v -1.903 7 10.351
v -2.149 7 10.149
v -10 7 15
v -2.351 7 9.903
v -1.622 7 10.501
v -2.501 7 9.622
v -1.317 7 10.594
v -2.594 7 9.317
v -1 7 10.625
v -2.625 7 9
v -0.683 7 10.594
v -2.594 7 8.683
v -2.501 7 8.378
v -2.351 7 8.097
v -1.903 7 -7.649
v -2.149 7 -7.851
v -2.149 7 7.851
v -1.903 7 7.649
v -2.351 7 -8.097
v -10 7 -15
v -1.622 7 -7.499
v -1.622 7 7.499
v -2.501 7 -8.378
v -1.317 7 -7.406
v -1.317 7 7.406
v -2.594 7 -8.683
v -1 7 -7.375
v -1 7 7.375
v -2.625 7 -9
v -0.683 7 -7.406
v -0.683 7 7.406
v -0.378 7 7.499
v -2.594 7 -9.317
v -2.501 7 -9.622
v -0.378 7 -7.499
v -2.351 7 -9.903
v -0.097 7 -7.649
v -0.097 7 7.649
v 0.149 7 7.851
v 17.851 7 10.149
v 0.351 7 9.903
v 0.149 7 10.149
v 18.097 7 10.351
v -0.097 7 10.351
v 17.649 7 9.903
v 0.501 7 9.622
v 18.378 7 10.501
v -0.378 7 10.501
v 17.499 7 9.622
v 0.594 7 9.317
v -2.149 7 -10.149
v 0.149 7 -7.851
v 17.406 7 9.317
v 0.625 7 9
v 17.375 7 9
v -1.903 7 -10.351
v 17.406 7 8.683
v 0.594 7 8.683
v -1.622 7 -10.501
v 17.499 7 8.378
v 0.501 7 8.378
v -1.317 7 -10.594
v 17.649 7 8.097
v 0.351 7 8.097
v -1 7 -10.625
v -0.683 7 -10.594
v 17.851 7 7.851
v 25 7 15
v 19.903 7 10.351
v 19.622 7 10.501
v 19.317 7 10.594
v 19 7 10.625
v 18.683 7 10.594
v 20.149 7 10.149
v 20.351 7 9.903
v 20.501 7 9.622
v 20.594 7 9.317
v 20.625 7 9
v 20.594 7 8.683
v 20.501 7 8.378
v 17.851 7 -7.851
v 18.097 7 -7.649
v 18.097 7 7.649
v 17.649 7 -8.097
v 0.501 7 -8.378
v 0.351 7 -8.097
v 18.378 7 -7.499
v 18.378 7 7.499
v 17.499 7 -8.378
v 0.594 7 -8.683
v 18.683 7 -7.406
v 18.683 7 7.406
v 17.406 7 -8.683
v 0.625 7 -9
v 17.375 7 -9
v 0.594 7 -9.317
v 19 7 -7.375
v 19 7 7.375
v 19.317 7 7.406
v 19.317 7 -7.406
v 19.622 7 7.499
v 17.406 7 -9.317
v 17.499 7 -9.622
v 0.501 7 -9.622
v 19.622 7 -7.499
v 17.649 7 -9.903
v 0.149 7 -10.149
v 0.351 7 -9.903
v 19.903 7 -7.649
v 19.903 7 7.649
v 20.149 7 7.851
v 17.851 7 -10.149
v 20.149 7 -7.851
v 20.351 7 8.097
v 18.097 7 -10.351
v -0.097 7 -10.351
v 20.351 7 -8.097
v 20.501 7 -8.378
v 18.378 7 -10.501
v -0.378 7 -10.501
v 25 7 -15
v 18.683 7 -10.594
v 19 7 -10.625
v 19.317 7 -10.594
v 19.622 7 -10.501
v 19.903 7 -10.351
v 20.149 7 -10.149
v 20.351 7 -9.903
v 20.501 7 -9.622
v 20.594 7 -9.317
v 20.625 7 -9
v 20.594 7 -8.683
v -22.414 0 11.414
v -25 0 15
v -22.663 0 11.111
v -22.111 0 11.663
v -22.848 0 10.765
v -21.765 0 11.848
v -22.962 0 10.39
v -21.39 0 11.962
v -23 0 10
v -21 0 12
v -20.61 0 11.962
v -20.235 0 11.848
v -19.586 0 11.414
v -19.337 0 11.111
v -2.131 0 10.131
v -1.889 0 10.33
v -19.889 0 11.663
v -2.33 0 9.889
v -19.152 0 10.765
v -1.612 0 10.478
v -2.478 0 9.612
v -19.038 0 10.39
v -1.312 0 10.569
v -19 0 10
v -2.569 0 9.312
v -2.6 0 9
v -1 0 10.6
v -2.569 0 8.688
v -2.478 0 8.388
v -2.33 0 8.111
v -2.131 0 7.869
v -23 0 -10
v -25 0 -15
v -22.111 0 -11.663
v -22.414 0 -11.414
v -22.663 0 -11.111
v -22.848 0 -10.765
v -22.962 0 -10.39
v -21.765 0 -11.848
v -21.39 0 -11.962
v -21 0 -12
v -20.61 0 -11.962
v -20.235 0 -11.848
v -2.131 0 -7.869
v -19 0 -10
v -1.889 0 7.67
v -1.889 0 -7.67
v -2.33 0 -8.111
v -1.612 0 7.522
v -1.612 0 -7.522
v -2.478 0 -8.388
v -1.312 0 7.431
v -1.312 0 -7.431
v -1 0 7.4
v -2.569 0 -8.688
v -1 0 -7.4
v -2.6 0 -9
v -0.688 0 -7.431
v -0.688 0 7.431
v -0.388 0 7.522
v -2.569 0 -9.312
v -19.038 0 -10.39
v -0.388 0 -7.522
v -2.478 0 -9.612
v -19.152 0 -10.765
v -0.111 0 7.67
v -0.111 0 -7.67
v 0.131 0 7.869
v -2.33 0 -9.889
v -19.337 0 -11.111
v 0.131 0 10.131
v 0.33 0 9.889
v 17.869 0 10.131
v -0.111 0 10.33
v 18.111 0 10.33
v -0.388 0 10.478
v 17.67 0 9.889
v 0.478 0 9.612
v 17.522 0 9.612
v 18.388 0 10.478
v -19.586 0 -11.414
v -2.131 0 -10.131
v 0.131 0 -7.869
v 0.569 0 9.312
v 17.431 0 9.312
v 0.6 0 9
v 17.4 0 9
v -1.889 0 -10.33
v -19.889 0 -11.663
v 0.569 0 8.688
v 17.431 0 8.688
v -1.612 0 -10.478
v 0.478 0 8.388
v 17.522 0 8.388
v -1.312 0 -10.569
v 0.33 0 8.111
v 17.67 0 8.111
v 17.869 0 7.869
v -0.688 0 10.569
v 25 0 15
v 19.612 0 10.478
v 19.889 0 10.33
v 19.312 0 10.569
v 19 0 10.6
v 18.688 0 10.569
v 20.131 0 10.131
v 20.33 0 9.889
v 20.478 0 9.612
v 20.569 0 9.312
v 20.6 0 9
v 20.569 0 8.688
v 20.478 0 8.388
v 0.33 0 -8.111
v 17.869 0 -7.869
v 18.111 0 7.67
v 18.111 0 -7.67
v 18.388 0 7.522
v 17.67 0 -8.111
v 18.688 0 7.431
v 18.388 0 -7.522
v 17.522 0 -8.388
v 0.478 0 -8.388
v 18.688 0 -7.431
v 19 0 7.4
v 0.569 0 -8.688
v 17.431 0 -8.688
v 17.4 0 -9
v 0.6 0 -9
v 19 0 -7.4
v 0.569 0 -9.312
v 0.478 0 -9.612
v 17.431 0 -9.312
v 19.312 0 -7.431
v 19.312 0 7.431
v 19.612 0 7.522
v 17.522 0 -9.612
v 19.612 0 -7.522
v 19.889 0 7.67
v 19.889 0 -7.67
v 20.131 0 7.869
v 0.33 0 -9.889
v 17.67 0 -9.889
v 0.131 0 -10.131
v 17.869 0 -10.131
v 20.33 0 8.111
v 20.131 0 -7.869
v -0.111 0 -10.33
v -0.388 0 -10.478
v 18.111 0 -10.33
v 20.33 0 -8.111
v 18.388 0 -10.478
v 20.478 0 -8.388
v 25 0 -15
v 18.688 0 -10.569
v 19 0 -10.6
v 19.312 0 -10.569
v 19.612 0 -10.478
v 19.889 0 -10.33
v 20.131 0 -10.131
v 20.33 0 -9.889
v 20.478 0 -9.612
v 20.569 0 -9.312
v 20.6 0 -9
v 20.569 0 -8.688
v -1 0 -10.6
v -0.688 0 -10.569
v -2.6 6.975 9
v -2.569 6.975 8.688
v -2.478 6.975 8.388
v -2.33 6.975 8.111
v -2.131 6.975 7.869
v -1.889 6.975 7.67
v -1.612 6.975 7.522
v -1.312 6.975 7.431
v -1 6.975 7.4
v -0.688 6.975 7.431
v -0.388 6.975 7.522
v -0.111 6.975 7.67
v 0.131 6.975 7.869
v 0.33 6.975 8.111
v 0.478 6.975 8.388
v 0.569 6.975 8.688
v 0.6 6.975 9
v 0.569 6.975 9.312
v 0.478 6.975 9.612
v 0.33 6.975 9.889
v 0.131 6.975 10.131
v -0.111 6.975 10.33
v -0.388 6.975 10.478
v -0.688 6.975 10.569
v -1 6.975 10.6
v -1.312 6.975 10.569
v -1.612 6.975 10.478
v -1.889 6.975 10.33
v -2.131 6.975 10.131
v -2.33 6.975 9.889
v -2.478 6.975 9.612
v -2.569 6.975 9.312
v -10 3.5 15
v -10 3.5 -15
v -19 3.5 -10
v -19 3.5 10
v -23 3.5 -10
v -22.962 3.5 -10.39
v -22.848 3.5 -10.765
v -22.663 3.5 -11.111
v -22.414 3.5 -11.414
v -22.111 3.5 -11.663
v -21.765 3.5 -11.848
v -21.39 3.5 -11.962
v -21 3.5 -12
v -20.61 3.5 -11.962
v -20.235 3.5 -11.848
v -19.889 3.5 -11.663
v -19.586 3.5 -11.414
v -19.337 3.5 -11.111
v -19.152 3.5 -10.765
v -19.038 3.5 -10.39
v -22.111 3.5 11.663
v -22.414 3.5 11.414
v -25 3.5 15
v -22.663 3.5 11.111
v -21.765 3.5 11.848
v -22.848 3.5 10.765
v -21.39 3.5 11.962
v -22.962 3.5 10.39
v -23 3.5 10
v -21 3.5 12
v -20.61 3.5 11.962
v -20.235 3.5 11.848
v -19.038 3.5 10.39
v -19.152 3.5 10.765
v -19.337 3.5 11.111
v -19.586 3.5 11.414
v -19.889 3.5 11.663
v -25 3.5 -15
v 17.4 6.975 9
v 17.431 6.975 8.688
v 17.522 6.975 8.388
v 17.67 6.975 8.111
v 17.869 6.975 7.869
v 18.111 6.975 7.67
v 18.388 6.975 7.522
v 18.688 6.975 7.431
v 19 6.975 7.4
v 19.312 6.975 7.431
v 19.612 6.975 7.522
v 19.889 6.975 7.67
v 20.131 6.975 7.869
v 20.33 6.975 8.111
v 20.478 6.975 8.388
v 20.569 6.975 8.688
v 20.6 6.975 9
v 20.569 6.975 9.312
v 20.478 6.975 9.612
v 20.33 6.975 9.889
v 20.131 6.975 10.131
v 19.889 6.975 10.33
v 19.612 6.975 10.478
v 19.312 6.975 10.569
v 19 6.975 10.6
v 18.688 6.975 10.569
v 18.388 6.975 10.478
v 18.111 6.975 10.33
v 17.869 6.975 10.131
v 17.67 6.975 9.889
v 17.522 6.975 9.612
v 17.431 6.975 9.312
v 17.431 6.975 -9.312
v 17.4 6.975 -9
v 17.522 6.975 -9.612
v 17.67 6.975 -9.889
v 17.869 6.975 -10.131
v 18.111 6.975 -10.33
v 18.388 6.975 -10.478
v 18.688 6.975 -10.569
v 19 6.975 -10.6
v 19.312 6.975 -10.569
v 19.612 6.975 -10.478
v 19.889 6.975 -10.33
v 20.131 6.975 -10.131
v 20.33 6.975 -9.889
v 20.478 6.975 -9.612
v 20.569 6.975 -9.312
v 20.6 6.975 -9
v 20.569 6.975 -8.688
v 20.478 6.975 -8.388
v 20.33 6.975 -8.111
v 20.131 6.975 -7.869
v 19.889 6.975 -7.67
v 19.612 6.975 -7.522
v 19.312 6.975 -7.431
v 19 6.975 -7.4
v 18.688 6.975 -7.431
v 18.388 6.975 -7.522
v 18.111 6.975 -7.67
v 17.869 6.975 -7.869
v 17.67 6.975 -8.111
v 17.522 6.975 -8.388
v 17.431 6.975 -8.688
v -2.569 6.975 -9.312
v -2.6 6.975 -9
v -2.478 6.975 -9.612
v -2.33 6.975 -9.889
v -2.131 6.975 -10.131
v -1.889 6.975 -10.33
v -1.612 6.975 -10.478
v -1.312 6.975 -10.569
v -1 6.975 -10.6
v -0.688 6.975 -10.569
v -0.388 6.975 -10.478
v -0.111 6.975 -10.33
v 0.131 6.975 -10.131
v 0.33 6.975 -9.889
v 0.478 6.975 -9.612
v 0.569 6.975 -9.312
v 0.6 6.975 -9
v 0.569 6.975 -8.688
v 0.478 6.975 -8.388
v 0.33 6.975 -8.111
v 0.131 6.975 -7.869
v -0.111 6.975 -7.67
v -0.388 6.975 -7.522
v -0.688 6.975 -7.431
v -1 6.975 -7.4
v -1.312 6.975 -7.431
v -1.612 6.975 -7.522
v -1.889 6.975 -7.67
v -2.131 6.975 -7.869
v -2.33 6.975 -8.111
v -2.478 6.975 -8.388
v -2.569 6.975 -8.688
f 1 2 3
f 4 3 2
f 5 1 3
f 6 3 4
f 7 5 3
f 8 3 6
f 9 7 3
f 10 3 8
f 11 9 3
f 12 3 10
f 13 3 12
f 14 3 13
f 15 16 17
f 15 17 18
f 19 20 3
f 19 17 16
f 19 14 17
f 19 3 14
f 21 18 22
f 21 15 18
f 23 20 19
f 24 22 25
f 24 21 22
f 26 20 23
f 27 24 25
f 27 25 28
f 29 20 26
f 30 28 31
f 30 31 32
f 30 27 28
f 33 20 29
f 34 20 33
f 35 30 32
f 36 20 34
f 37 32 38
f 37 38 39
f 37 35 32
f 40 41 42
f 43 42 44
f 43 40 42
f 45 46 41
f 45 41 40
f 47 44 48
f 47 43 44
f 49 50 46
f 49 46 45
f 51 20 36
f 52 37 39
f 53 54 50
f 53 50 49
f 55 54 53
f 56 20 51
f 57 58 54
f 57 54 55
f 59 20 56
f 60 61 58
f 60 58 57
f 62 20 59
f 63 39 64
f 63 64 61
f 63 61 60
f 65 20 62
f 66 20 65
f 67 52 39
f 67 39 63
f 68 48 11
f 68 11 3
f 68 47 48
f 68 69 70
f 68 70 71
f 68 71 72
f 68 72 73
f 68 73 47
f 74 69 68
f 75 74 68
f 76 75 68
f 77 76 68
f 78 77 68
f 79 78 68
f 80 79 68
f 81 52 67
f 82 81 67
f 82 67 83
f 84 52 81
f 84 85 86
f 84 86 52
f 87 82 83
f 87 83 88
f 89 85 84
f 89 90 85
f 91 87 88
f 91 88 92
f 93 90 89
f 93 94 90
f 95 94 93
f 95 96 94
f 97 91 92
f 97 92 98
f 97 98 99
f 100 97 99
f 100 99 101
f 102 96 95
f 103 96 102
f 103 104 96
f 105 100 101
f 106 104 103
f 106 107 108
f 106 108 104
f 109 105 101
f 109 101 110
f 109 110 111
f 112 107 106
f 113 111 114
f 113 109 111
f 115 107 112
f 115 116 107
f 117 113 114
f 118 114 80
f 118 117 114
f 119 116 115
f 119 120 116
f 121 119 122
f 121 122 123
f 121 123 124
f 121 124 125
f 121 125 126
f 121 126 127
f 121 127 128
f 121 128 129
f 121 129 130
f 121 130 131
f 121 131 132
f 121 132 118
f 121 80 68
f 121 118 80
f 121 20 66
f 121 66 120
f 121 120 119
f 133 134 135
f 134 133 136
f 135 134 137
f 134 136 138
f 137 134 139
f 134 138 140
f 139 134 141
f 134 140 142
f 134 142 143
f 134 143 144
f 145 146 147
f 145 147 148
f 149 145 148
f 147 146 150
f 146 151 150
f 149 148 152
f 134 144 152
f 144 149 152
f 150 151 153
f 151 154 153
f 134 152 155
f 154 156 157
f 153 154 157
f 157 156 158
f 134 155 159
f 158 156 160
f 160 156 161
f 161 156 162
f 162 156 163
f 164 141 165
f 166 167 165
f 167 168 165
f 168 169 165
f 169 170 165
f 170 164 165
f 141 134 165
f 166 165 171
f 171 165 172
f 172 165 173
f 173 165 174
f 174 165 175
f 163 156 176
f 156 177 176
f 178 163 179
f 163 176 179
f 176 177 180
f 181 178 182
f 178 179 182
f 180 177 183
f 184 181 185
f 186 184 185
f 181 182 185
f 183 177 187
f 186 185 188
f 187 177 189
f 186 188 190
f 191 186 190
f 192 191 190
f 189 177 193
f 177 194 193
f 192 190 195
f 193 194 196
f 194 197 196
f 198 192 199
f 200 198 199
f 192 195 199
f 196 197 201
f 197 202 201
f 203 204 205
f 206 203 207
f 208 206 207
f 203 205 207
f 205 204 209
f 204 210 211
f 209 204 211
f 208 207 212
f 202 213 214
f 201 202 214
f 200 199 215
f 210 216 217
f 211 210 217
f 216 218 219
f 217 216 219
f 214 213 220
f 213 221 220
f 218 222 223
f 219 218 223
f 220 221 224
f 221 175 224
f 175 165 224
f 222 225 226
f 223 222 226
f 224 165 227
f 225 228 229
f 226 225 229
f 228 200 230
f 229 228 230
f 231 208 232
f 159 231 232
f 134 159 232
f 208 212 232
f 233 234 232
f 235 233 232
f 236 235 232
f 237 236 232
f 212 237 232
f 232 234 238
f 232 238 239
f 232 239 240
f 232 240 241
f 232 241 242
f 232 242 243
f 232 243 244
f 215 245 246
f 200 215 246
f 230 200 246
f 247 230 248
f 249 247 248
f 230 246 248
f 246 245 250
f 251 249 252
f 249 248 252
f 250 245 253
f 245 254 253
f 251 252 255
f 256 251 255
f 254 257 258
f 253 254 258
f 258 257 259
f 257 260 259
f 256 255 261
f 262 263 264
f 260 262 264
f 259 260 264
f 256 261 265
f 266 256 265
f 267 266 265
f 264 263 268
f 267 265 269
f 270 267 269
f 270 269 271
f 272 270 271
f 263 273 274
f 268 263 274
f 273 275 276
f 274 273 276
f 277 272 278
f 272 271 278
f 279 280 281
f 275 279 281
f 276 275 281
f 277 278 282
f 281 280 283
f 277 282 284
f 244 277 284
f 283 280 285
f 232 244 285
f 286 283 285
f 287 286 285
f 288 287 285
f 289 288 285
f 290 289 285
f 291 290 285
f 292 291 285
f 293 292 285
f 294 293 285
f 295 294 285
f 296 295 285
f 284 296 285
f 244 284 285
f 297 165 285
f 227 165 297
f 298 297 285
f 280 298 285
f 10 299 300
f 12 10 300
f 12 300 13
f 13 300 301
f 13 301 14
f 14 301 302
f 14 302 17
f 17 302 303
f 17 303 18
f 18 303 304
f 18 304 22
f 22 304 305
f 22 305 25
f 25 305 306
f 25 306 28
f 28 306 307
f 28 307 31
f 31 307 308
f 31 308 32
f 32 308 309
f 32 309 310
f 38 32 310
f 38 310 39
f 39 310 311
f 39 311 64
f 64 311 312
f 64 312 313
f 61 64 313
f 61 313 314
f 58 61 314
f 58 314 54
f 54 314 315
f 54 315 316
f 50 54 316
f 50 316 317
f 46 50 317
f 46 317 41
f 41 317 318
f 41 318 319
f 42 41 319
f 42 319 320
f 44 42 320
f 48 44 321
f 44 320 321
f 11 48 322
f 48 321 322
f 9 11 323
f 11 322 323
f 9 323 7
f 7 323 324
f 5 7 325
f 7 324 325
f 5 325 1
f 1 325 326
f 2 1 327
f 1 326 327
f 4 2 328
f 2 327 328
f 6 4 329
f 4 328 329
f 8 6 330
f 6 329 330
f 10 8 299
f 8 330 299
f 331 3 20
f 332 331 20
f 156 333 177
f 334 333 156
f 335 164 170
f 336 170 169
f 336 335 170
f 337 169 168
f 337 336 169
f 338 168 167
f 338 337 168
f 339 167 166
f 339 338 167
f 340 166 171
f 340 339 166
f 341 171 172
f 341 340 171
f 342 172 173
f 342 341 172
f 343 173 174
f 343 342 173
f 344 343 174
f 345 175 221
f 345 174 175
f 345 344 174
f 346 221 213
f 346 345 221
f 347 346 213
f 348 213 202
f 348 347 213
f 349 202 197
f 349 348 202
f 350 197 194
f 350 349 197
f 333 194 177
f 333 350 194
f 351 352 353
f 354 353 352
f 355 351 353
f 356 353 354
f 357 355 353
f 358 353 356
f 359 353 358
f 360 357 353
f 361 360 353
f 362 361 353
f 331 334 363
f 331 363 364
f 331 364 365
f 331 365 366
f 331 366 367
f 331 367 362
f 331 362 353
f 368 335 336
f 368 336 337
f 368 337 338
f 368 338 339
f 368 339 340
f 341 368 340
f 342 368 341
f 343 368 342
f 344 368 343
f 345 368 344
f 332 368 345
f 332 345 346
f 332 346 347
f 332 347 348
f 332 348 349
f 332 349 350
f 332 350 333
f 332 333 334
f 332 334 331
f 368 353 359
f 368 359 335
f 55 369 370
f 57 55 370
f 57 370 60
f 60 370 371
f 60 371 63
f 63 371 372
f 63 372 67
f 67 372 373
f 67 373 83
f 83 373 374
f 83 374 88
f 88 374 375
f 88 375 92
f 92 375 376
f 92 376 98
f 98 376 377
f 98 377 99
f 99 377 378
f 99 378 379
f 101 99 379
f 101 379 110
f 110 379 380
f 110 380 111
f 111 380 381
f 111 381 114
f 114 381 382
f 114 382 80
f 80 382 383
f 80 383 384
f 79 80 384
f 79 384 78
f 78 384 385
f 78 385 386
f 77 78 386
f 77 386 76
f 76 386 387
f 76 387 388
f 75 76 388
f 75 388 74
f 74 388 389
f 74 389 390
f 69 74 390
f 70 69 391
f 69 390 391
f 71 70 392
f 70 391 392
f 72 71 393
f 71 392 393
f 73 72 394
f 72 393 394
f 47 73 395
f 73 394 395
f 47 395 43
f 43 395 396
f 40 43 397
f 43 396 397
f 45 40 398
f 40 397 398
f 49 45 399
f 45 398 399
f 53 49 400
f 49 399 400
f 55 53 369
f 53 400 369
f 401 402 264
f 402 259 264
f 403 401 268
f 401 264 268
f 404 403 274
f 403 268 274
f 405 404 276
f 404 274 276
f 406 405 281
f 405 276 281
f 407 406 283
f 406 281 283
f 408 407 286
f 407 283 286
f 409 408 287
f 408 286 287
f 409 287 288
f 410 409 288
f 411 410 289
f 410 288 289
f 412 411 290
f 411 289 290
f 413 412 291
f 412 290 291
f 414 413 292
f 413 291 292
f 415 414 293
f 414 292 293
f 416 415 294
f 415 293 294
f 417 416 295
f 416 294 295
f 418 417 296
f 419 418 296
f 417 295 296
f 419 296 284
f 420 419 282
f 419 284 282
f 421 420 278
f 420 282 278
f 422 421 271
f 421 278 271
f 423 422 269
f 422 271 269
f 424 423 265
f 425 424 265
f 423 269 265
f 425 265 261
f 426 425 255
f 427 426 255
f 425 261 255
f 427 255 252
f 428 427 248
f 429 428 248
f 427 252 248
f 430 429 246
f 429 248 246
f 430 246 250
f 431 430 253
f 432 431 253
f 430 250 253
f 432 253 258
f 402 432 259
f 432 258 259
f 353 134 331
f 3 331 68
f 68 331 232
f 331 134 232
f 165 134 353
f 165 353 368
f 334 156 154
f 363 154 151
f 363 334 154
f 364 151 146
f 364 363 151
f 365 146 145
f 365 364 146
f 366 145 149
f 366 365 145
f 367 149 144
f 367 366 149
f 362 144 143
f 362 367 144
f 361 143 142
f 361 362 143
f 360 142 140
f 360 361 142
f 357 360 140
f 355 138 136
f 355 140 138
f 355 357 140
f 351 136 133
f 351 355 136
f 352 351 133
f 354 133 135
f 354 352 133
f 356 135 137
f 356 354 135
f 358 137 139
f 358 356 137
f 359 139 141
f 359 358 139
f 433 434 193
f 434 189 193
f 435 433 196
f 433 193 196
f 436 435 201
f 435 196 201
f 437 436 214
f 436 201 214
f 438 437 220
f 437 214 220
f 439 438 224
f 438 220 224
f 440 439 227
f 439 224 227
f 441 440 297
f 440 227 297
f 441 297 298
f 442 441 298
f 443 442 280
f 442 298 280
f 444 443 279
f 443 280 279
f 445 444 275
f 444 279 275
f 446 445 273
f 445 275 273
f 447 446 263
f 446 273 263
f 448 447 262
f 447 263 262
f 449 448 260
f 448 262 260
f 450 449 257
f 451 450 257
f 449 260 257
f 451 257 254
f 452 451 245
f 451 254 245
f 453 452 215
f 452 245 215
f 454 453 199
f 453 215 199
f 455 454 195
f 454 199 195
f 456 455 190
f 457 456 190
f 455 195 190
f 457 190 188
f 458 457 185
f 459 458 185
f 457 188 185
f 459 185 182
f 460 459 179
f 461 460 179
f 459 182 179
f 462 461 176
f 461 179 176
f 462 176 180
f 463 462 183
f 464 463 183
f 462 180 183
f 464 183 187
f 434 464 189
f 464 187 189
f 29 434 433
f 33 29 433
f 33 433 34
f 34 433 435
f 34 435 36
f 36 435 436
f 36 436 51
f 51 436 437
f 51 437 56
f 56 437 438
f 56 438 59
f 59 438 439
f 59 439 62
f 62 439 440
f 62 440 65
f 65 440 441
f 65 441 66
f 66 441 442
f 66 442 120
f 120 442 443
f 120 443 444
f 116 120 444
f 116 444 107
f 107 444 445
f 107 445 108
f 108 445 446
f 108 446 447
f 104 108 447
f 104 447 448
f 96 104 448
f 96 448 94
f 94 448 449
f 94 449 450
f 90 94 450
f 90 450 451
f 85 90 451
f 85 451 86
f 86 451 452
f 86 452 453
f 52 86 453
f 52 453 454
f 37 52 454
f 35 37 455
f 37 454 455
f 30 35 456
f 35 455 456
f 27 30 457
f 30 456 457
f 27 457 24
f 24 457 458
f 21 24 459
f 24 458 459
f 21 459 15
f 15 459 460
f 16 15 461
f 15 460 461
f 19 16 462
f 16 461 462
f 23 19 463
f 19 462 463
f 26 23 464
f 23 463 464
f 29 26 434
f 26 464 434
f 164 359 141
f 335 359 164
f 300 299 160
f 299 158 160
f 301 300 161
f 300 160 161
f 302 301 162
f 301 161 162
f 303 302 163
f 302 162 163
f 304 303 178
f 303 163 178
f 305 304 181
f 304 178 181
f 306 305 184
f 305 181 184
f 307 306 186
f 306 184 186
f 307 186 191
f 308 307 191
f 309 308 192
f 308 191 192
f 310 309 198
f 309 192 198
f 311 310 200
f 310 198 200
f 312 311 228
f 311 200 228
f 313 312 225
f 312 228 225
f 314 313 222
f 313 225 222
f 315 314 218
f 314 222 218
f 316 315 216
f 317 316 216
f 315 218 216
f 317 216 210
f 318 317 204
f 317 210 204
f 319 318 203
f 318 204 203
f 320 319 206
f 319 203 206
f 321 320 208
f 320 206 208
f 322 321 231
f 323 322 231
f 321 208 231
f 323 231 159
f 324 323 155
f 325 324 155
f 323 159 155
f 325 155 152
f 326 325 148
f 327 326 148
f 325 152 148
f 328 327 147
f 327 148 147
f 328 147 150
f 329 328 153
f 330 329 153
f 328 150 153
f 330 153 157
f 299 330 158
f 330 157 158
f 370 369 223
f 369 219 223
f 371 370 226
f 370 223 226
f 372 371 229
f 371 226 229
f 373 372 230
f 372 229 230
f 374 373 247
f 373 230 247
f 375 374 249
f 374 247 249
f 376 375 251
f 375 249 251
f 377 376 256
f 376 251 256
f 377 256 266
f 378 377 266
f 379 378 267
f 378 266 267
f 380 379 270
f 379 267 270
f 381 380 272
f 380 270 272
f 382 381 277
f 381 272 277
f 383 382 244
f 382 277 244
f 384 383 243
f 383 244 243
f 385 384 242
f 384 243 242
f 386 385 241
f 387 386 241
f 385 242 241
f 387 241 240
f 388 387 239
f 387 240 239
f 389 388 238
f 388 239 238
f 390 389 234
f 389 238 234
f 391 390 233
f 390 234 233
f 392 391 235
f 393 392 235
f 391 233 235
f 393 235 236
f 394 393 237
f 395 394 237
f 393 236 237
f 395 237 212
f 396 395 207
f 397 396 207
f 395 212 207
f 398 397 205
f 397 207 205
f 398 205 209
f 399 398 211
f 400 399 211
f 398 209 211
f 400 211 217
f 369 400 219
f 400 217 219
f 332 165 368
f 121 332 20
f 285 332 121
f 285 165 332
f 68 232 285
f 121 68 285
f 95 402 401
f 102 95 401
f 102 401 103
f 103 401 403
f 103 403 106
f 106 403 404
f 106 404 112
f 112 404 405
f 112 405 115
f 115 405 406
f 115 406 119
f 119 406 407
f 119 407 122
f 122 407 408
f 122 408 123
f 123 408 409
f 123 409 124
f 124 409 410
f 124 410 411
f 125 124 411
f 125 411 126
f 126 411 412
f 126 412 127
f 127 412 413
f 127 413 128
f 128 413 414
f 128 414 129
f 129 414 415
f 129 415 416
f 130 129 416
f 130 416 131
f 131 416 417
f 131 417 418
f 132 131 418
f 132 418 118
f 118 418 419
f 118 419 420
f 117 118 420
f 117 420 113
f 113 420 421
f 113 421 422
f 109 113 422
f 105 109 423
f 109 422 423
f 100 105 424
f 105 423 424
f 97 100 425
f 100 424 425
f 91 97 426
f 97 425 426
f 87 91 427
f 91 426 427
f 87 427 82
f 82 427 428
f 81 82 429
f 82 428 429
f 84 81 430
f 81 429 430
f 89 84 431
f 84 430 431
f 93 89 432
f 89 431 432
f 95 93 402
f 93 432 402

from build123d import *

# Parameters (mm, degrees)
SKETCH1_W                      = 50
SKETCH1_H                      = 30
BOSS_EXTRUDE1_DEPTH            = 7
SKETCH2_W                      = 15
SKETCH2_H                      = 30
CUT_EXTRUDE1_DEPTH             = 3.5
CUT_EXTRUDE2_DEPTH             = 4.5
M3_CLEARANCE_HOLE1_D           = 3.2
M3_CLEARANCE_HOLE1_CSINK_D     = 3.25
M3_CLEARANCE_HOLE1_CSINK_ANGLE = 90


with BuildPart() as part:
    # Sketch1 → Boss-Extrude1 (new body)
    with BuildSketch(Plane(origin=(0, 0, 0), x_dir=(1, 0, 0), z_dir=(0, 1, 0))):
        Rectangle(SKETCH1_W, SKETCH1_H)
    extrude(amount=BOSS_EXTRUDE1_DEPTH)

    # Sketch2 → Cut-Extrude1 (cut)
    with BuildSketch(Plane(origin=(0, 7, 0), x_dir=(1, 0, 0), z_dir=(0, 1, 0))):
        with Locations((-17.5, 0)):
            Rectangle(SKETCH2_W, SKETCH2_H)
    extrude(amount=-CUT_EXTRUDE1_DEPTH, mode=Mode.SUBTRACT)

    # Sketch3 → Cut-Extrude2 (cut, through all)
    with BuildSketch(Plane(origin=(0, 3.5, 0), x_dir=(1, 0, 0), z_dir=(0, 1, 0))):
        with BuildLine():
            Line((-19, 10), (-19, -10))
            ThreePointArc((-19, -10), (-21, -12), (-23, -10))
            Line((-23, -10), (-23, 10))
            ThreePointArc((-23, 10), (-21, 12), (-19, 10))
        make_face()
    extrude(amount=-CUT_EXTRUDE2_DEPTH, mode=Mode.SUBTRACT)

    # M3 Clearance Hole1 (through all)
    with Locations(Plane(origin=(0, 7, 0), x_dir=(1, 0, 0), z_dir=(0, 1, 0))):
        with Locations((-1, 9), (-1, -9), (19, 9), (19, -9)):
            CounterSinkHole(M3_CLEARANCE_HOLE1_D / 2, M3_CLEARANCE_HOLE1_CSINK_D / 2, counter_sink_angle=M3_CLEARANCE_HOLE1_CSINK_ANGLE)


solid = part.part
